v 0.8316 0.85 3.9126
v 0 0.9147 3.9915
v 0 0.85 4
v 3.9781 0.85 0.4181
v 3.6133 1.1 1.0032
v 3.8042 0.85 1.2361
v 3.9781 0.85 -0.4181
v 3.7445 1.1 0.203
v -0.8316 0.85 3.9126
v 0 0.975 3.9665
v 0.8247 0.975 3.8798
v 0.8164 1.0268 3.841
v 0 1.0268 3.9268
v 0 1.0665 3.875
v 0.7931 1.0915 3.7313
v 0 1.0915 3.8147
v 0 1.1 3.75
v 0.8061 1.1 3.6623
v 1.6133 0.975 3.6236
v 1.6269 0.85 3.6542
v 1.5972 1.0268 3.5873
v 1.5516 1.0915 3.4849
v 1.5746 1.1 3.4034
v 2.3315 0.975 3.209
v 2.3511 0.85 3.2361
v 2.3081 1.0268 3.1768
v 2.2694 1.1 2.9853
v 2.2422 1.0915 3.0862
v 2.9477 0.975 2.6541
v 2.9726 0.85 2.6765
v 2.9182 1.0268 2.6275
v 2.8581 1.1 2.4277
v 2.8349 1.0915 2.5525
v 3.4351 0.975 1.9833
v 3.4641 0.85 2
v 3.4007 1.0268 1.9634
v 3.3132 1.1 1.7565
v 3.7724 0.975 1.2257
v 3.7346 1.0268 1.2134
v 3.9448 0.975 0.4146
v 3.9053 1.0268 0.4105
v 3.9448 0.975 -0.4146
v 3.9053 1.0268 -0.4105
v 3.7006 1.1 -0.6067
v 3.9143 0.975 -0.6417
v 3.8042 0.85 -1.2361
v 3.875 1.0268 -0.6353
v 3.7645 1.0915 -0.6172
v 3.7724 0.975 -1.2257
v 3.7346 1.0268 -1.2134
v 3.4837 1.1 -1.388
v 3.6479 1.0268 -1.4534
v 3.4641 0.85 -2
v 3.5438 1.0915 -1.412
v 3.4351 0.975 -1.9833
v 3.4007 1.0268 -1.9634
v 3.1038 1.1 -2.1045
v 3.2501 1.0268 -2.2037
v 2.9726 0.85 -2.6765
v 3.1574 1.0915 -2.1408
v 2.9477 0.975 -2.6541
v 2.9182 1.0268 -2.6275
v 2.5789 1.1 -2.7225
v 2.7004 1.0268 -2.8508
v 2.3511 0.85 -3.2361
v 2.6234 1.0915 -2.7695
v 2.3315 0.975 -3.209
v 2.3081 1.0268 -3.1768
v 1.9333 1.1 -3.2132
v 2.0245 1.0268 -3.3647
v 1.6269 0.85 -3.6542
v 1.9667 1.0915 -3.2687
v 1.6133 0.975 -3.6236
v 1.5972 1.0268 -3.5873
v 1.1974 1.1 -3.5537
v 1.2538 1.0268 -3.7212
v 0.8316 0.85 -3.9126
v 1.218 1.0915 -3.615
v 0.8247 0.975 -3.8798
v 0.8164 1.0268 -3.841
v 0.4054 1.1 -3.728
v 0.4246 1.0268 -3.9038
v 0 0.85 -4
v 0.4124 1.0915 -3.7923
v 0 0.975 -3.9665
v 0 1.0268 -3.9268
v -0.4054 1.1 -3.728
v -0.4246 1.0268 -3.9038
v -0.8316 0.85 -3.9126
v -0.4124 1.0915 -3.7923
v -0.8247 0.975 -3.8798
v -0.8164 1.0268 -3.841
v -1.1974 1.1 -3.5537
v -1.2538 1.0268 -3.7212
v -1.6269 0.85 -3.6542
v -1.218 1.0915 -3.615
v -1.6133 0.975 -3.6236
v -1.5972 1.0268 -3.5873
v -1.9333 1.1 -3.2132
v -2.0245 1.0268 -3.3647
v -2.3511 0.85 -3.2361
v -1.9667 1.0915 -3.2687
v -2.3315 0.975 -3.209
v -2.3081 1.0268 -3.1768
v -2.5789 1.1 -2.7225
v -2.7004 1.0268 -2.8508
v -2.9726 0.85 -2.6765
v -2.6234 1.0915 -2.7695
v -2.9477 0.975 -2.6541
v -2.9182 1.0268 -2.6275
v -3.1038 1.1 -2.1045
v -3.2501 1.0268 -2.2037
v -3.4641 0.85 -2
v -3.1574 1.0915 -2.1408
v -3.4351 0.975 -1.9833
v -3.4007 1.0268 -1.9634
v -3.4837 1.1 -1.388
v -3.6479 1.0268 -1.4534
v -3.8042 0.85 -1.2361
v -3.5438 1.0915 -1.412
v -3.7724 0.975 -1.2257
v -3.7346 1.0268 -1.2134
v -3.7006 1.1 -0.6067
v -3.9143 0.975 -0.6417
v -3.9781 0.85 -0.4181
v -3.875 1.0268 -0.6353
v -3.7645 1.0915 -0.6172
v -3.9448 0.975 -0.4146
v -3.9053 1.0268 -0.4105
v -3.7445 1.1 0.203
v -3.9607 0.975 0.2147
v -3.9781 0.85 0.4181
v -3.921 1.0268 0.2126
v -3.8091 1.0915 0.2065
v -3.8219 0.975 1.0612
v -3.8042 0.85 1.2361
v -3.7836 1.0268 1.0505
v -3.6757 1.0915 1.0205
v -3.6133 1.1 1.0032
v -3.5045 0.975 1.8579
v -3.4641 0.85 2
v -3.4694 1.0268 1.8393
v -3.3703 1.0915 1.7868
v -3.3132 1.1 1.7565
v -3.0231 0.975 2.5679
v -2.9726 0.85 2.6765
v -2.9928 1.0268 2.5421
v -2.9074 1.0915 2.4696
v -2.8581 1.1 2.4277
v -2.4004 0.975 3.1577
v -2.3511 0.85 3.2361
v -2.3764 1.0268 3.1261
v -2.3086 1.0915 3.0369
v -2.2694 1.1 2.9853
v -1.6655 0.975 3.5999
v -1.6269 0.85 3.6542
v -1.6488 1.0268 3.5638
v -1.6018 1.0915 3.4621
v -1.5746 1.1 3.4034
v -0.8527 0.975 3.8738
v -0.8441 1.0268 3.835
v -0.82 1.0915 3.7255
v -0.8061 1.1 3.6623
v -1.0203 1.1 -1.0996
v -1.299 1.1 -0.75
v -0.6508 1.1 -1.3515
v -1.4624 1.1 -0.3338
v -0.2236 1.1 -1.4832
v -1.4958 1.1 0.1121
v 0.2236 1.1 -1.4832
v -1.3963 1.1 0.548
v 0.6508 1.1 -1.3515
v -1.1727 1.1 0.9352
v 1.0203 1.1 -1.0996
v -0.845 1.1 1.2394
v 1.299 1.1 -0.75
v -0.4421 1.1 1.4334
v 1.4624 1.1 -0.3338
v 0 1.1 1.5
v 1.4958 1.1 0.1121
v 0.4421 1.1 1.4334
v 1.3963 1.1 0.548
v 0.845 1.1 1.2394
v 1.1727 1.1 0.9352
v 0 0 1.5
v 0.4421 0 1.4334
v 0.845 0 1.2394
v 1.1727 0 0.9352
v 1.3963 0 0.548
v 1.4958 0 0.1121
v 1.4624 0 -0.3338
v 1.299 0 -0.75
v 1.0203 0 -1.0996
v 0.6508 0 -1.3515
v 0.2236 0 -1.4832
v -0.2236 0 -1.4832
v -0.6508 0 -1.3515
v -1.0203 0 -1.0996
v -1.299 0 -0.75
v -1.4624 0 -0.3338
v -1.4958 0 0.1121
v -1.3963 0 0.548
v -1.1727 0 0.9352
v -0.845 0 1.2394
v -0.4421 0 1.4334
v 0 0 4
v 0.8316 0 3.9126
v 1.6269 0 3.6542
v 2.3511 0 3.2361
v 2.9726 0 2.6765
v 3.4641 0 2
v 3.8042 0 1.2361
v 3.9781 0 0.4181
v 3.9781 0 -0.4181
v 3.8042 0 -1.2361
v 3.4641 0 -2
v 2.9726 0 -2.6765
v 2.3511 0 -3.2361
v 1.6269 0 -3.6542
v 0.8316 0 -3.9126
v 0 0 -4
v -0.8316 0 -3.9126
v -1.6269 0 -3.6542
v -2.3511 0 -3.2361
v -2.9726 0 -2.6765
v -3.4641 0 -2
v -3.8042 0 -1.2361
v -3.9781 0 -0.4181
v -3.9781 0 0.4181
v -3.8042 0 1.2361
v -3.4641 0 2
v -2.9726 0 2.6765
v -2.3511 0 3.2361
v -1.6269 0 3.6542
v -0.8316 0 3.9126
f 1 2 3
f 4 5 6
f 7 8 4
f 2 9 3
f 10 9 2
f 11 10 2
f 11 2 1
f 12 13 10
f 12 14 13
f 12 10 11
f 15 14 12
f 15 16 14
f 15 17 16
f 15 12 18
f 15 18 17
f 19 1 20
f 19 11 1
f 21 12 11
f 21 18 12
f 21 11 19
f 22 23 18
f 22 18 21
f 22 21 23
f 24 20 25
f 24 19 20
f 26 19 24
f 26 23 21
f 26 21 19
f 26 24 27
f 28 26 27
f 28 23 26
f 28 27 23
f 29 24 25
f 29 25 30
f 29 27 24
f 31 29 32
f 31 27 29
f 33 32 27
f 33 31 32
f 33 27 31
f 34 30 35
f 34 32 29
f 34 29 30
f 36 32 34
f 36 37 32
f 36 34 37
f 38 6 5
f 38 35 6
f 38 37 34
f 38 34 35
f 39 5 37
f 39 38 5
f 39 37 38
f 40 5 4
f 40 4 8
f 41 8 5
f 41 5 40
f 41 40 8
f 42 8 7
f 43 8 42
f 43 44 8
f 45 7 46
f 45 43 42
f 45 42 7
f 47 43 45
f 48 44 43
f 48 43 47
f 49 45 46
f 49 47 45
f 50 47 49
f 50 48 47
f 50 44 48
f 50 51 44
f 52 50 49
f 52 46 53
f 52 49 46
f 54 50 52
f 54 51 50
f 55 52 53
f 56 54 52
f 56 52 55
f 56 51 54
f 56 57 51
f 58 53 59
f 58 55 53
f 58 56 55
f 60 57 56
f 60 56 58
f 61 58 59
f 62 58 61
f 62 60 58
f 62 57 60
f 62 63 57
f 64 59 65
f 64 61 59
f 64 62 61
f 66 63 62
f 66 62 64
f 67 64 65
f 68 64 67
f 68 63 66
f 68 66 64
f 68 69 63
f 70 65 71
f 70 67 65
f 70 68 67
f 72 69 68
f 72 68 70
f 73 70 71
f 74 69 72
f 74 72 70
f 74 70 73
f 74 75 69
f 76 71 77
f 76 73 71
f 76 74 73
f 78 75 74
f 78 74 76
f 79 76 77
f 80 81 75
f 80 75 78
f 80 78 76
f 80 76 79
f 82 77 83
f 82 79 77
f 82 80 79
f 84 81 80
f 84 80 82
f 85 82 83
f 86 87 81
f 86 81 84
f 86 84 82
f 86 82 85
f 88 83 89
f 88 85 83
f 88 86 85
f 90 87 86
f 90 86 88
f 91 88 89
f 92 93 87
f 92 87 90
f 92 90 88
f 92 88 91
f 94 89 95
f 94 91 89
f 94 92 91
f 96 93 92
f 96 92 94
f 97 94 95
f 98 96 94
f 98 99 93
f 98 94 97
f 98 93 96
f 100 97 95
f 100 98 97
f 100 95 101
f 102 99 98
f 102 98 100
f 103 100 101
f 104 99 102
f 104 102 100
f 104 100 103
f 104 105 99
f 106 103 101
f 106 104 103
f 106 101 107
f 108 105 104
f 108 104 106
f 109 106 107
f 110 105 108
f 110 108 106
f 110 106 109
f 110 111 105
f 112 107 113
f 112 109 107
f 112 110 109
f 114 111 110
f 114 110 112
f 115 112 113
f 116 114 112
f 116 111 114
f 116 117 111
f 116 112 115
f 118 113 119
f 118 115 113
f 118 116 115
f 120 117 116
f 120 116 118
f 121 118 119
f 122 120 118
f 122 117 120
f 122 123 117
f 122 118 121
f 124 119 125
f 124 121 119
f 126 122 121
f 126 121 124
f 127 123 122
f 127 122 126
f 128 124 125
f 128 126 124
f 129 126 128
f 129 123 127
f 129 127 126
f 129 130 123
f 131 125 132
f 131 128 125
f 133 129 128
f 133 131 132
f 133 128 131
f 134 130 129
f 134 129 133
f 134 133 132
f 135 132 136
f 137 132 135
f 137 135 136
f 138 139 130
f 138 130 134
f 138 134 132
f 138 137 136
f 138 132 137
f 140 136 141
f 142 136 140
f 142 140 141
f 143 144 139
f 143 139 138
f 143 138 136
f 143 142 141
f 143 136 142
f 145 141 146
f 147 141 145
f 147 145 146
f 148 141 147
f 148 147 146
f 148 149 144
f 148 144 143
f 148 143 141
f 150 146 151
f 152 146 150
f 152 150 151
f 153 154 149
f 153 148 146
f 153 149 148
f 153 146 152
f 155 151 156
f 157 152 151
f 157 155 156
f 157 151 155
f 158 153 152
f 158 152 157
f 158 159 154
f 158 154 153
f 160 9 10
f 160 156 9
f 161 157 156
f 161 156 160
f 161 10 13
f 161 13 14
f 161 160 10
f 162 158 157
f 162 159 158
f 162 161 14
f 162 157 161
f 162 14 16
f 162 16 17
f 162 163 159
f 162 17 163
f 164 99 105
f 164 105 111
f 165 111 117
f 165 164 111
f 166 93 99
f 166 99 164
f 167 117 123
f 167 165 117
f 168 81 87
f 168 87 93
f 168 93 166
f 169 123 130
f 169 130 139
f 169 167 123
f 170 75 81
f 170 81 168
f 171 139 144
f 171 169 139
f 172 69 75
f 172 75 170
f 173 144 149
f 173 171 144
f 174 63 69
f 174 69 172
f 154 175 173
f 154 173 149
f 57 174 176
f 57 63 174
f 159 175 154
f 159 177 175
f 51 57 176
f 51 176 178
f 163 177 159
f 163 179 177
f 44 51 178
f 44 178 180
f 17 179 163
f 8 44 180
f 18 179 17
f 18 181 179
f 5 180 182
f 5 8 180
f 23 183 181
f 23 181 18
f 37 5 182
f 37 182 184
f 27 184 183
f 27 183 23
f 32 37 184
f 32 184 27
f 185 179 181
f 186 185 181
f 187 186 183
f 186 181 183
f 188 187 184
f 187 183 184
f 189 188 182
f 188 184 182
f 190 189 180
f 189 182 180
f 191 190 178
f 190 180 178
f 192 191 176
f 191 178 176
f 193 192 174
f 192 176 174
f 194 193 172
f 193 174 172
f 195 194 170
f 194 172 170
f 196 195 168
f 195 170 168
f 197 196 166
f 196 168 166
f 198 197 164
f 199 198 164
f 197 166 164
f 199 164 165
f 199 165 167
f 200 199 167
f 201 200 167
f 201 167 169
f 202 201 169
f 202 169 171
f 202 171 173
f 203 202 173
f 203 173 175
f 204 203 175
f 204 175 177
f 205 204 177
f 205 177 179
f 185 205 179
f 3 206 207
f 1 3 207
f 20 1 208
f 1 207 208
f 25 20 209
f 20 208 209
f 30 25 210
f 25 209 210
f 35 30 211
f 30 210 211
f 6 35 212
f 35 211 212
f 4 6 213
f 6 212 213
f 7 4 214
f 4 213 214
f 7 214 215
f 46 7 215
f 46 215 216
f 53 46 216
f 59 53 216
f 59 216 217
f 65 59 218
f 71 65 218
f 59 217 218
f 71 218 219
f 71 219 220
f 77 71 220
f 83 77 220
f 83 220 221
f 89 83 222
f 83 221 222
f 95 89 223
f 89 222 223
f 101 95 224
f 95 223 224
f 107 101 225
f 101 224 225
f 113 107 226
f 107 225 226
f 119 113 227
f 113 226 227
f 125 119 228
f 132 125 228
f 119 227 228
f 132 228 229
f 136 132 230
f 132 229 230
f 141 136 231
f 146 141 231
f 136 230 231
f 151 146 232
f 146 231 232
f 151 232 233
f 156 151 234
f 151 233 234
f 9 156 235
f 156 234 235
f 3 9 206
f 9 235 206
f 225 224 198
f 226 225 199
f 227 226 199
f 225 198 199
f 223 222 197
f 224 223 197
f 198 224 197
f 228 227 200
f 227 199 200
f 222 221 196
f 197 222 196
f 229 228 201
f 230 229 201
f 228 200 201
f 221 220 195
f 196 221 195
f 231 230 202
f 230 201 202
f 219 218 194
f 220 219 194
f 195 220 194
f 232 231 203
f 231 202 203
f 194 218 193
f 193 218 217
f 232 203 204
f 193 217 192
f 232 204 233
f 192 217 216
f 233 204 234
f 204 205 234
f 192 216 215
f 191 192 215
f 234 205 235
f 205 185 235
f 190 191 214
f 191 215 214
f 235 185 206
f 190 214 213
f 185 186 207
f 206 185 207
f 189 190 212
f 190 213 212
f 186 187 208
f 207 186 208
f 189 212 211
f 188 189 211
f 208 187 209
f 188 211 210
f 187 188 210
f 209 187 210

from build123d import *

# Parameters (mm, degrees)
CROQUIS_BASE_R          = 4
SALIENTE_EXTRUIR3_DEPTH = 1.1
CROQUIS_BARRENO_R       = 1.5
CORTAR_EXTRUIR1_DEPTH   = 6.762811814
REDONDEO1_R             = 0.25


with BuildPart() as part:
    # Croquis base → Saliente-Extruir3 (new body)
    with BuildSketch(Plane(origin=(0, 0, 0), x_dir=(1, 0, 0), z_dir=(0, 1, 0))):
        with Locations(Location((0, 0, 0), (0, 0, 270))):
            Circle(CROQUIS_BASE_R)
    extrude(amount=SALIENTE_EXTRUIR3_DEPTH)

    # Croquis barreno → Cortar-Extruir1 (cut, through all)
    with BuildSketch(Plane(origin=(0, 1.1, 0), x_dir=(1, 0, 0), z_dir=(0, 1, 0))):
        with Locations(Location((0, 0, 0), (0, 0, 270))):
            Circle(CROQUIS_BARRENO_R)
    extrude(amount=-CORTAR_EXTRUIR1_DEPTH, mode=Mode.SUBTRACT)

    # Redondeo1
    redondeo1_edges = [part.edges().sort_by_distance(p)[0] for p in [
        (0, 1.1, -4),
    ]]
    fillet(redondeo1_edges, radius=REDONDEO1_R)


solid = part.part
